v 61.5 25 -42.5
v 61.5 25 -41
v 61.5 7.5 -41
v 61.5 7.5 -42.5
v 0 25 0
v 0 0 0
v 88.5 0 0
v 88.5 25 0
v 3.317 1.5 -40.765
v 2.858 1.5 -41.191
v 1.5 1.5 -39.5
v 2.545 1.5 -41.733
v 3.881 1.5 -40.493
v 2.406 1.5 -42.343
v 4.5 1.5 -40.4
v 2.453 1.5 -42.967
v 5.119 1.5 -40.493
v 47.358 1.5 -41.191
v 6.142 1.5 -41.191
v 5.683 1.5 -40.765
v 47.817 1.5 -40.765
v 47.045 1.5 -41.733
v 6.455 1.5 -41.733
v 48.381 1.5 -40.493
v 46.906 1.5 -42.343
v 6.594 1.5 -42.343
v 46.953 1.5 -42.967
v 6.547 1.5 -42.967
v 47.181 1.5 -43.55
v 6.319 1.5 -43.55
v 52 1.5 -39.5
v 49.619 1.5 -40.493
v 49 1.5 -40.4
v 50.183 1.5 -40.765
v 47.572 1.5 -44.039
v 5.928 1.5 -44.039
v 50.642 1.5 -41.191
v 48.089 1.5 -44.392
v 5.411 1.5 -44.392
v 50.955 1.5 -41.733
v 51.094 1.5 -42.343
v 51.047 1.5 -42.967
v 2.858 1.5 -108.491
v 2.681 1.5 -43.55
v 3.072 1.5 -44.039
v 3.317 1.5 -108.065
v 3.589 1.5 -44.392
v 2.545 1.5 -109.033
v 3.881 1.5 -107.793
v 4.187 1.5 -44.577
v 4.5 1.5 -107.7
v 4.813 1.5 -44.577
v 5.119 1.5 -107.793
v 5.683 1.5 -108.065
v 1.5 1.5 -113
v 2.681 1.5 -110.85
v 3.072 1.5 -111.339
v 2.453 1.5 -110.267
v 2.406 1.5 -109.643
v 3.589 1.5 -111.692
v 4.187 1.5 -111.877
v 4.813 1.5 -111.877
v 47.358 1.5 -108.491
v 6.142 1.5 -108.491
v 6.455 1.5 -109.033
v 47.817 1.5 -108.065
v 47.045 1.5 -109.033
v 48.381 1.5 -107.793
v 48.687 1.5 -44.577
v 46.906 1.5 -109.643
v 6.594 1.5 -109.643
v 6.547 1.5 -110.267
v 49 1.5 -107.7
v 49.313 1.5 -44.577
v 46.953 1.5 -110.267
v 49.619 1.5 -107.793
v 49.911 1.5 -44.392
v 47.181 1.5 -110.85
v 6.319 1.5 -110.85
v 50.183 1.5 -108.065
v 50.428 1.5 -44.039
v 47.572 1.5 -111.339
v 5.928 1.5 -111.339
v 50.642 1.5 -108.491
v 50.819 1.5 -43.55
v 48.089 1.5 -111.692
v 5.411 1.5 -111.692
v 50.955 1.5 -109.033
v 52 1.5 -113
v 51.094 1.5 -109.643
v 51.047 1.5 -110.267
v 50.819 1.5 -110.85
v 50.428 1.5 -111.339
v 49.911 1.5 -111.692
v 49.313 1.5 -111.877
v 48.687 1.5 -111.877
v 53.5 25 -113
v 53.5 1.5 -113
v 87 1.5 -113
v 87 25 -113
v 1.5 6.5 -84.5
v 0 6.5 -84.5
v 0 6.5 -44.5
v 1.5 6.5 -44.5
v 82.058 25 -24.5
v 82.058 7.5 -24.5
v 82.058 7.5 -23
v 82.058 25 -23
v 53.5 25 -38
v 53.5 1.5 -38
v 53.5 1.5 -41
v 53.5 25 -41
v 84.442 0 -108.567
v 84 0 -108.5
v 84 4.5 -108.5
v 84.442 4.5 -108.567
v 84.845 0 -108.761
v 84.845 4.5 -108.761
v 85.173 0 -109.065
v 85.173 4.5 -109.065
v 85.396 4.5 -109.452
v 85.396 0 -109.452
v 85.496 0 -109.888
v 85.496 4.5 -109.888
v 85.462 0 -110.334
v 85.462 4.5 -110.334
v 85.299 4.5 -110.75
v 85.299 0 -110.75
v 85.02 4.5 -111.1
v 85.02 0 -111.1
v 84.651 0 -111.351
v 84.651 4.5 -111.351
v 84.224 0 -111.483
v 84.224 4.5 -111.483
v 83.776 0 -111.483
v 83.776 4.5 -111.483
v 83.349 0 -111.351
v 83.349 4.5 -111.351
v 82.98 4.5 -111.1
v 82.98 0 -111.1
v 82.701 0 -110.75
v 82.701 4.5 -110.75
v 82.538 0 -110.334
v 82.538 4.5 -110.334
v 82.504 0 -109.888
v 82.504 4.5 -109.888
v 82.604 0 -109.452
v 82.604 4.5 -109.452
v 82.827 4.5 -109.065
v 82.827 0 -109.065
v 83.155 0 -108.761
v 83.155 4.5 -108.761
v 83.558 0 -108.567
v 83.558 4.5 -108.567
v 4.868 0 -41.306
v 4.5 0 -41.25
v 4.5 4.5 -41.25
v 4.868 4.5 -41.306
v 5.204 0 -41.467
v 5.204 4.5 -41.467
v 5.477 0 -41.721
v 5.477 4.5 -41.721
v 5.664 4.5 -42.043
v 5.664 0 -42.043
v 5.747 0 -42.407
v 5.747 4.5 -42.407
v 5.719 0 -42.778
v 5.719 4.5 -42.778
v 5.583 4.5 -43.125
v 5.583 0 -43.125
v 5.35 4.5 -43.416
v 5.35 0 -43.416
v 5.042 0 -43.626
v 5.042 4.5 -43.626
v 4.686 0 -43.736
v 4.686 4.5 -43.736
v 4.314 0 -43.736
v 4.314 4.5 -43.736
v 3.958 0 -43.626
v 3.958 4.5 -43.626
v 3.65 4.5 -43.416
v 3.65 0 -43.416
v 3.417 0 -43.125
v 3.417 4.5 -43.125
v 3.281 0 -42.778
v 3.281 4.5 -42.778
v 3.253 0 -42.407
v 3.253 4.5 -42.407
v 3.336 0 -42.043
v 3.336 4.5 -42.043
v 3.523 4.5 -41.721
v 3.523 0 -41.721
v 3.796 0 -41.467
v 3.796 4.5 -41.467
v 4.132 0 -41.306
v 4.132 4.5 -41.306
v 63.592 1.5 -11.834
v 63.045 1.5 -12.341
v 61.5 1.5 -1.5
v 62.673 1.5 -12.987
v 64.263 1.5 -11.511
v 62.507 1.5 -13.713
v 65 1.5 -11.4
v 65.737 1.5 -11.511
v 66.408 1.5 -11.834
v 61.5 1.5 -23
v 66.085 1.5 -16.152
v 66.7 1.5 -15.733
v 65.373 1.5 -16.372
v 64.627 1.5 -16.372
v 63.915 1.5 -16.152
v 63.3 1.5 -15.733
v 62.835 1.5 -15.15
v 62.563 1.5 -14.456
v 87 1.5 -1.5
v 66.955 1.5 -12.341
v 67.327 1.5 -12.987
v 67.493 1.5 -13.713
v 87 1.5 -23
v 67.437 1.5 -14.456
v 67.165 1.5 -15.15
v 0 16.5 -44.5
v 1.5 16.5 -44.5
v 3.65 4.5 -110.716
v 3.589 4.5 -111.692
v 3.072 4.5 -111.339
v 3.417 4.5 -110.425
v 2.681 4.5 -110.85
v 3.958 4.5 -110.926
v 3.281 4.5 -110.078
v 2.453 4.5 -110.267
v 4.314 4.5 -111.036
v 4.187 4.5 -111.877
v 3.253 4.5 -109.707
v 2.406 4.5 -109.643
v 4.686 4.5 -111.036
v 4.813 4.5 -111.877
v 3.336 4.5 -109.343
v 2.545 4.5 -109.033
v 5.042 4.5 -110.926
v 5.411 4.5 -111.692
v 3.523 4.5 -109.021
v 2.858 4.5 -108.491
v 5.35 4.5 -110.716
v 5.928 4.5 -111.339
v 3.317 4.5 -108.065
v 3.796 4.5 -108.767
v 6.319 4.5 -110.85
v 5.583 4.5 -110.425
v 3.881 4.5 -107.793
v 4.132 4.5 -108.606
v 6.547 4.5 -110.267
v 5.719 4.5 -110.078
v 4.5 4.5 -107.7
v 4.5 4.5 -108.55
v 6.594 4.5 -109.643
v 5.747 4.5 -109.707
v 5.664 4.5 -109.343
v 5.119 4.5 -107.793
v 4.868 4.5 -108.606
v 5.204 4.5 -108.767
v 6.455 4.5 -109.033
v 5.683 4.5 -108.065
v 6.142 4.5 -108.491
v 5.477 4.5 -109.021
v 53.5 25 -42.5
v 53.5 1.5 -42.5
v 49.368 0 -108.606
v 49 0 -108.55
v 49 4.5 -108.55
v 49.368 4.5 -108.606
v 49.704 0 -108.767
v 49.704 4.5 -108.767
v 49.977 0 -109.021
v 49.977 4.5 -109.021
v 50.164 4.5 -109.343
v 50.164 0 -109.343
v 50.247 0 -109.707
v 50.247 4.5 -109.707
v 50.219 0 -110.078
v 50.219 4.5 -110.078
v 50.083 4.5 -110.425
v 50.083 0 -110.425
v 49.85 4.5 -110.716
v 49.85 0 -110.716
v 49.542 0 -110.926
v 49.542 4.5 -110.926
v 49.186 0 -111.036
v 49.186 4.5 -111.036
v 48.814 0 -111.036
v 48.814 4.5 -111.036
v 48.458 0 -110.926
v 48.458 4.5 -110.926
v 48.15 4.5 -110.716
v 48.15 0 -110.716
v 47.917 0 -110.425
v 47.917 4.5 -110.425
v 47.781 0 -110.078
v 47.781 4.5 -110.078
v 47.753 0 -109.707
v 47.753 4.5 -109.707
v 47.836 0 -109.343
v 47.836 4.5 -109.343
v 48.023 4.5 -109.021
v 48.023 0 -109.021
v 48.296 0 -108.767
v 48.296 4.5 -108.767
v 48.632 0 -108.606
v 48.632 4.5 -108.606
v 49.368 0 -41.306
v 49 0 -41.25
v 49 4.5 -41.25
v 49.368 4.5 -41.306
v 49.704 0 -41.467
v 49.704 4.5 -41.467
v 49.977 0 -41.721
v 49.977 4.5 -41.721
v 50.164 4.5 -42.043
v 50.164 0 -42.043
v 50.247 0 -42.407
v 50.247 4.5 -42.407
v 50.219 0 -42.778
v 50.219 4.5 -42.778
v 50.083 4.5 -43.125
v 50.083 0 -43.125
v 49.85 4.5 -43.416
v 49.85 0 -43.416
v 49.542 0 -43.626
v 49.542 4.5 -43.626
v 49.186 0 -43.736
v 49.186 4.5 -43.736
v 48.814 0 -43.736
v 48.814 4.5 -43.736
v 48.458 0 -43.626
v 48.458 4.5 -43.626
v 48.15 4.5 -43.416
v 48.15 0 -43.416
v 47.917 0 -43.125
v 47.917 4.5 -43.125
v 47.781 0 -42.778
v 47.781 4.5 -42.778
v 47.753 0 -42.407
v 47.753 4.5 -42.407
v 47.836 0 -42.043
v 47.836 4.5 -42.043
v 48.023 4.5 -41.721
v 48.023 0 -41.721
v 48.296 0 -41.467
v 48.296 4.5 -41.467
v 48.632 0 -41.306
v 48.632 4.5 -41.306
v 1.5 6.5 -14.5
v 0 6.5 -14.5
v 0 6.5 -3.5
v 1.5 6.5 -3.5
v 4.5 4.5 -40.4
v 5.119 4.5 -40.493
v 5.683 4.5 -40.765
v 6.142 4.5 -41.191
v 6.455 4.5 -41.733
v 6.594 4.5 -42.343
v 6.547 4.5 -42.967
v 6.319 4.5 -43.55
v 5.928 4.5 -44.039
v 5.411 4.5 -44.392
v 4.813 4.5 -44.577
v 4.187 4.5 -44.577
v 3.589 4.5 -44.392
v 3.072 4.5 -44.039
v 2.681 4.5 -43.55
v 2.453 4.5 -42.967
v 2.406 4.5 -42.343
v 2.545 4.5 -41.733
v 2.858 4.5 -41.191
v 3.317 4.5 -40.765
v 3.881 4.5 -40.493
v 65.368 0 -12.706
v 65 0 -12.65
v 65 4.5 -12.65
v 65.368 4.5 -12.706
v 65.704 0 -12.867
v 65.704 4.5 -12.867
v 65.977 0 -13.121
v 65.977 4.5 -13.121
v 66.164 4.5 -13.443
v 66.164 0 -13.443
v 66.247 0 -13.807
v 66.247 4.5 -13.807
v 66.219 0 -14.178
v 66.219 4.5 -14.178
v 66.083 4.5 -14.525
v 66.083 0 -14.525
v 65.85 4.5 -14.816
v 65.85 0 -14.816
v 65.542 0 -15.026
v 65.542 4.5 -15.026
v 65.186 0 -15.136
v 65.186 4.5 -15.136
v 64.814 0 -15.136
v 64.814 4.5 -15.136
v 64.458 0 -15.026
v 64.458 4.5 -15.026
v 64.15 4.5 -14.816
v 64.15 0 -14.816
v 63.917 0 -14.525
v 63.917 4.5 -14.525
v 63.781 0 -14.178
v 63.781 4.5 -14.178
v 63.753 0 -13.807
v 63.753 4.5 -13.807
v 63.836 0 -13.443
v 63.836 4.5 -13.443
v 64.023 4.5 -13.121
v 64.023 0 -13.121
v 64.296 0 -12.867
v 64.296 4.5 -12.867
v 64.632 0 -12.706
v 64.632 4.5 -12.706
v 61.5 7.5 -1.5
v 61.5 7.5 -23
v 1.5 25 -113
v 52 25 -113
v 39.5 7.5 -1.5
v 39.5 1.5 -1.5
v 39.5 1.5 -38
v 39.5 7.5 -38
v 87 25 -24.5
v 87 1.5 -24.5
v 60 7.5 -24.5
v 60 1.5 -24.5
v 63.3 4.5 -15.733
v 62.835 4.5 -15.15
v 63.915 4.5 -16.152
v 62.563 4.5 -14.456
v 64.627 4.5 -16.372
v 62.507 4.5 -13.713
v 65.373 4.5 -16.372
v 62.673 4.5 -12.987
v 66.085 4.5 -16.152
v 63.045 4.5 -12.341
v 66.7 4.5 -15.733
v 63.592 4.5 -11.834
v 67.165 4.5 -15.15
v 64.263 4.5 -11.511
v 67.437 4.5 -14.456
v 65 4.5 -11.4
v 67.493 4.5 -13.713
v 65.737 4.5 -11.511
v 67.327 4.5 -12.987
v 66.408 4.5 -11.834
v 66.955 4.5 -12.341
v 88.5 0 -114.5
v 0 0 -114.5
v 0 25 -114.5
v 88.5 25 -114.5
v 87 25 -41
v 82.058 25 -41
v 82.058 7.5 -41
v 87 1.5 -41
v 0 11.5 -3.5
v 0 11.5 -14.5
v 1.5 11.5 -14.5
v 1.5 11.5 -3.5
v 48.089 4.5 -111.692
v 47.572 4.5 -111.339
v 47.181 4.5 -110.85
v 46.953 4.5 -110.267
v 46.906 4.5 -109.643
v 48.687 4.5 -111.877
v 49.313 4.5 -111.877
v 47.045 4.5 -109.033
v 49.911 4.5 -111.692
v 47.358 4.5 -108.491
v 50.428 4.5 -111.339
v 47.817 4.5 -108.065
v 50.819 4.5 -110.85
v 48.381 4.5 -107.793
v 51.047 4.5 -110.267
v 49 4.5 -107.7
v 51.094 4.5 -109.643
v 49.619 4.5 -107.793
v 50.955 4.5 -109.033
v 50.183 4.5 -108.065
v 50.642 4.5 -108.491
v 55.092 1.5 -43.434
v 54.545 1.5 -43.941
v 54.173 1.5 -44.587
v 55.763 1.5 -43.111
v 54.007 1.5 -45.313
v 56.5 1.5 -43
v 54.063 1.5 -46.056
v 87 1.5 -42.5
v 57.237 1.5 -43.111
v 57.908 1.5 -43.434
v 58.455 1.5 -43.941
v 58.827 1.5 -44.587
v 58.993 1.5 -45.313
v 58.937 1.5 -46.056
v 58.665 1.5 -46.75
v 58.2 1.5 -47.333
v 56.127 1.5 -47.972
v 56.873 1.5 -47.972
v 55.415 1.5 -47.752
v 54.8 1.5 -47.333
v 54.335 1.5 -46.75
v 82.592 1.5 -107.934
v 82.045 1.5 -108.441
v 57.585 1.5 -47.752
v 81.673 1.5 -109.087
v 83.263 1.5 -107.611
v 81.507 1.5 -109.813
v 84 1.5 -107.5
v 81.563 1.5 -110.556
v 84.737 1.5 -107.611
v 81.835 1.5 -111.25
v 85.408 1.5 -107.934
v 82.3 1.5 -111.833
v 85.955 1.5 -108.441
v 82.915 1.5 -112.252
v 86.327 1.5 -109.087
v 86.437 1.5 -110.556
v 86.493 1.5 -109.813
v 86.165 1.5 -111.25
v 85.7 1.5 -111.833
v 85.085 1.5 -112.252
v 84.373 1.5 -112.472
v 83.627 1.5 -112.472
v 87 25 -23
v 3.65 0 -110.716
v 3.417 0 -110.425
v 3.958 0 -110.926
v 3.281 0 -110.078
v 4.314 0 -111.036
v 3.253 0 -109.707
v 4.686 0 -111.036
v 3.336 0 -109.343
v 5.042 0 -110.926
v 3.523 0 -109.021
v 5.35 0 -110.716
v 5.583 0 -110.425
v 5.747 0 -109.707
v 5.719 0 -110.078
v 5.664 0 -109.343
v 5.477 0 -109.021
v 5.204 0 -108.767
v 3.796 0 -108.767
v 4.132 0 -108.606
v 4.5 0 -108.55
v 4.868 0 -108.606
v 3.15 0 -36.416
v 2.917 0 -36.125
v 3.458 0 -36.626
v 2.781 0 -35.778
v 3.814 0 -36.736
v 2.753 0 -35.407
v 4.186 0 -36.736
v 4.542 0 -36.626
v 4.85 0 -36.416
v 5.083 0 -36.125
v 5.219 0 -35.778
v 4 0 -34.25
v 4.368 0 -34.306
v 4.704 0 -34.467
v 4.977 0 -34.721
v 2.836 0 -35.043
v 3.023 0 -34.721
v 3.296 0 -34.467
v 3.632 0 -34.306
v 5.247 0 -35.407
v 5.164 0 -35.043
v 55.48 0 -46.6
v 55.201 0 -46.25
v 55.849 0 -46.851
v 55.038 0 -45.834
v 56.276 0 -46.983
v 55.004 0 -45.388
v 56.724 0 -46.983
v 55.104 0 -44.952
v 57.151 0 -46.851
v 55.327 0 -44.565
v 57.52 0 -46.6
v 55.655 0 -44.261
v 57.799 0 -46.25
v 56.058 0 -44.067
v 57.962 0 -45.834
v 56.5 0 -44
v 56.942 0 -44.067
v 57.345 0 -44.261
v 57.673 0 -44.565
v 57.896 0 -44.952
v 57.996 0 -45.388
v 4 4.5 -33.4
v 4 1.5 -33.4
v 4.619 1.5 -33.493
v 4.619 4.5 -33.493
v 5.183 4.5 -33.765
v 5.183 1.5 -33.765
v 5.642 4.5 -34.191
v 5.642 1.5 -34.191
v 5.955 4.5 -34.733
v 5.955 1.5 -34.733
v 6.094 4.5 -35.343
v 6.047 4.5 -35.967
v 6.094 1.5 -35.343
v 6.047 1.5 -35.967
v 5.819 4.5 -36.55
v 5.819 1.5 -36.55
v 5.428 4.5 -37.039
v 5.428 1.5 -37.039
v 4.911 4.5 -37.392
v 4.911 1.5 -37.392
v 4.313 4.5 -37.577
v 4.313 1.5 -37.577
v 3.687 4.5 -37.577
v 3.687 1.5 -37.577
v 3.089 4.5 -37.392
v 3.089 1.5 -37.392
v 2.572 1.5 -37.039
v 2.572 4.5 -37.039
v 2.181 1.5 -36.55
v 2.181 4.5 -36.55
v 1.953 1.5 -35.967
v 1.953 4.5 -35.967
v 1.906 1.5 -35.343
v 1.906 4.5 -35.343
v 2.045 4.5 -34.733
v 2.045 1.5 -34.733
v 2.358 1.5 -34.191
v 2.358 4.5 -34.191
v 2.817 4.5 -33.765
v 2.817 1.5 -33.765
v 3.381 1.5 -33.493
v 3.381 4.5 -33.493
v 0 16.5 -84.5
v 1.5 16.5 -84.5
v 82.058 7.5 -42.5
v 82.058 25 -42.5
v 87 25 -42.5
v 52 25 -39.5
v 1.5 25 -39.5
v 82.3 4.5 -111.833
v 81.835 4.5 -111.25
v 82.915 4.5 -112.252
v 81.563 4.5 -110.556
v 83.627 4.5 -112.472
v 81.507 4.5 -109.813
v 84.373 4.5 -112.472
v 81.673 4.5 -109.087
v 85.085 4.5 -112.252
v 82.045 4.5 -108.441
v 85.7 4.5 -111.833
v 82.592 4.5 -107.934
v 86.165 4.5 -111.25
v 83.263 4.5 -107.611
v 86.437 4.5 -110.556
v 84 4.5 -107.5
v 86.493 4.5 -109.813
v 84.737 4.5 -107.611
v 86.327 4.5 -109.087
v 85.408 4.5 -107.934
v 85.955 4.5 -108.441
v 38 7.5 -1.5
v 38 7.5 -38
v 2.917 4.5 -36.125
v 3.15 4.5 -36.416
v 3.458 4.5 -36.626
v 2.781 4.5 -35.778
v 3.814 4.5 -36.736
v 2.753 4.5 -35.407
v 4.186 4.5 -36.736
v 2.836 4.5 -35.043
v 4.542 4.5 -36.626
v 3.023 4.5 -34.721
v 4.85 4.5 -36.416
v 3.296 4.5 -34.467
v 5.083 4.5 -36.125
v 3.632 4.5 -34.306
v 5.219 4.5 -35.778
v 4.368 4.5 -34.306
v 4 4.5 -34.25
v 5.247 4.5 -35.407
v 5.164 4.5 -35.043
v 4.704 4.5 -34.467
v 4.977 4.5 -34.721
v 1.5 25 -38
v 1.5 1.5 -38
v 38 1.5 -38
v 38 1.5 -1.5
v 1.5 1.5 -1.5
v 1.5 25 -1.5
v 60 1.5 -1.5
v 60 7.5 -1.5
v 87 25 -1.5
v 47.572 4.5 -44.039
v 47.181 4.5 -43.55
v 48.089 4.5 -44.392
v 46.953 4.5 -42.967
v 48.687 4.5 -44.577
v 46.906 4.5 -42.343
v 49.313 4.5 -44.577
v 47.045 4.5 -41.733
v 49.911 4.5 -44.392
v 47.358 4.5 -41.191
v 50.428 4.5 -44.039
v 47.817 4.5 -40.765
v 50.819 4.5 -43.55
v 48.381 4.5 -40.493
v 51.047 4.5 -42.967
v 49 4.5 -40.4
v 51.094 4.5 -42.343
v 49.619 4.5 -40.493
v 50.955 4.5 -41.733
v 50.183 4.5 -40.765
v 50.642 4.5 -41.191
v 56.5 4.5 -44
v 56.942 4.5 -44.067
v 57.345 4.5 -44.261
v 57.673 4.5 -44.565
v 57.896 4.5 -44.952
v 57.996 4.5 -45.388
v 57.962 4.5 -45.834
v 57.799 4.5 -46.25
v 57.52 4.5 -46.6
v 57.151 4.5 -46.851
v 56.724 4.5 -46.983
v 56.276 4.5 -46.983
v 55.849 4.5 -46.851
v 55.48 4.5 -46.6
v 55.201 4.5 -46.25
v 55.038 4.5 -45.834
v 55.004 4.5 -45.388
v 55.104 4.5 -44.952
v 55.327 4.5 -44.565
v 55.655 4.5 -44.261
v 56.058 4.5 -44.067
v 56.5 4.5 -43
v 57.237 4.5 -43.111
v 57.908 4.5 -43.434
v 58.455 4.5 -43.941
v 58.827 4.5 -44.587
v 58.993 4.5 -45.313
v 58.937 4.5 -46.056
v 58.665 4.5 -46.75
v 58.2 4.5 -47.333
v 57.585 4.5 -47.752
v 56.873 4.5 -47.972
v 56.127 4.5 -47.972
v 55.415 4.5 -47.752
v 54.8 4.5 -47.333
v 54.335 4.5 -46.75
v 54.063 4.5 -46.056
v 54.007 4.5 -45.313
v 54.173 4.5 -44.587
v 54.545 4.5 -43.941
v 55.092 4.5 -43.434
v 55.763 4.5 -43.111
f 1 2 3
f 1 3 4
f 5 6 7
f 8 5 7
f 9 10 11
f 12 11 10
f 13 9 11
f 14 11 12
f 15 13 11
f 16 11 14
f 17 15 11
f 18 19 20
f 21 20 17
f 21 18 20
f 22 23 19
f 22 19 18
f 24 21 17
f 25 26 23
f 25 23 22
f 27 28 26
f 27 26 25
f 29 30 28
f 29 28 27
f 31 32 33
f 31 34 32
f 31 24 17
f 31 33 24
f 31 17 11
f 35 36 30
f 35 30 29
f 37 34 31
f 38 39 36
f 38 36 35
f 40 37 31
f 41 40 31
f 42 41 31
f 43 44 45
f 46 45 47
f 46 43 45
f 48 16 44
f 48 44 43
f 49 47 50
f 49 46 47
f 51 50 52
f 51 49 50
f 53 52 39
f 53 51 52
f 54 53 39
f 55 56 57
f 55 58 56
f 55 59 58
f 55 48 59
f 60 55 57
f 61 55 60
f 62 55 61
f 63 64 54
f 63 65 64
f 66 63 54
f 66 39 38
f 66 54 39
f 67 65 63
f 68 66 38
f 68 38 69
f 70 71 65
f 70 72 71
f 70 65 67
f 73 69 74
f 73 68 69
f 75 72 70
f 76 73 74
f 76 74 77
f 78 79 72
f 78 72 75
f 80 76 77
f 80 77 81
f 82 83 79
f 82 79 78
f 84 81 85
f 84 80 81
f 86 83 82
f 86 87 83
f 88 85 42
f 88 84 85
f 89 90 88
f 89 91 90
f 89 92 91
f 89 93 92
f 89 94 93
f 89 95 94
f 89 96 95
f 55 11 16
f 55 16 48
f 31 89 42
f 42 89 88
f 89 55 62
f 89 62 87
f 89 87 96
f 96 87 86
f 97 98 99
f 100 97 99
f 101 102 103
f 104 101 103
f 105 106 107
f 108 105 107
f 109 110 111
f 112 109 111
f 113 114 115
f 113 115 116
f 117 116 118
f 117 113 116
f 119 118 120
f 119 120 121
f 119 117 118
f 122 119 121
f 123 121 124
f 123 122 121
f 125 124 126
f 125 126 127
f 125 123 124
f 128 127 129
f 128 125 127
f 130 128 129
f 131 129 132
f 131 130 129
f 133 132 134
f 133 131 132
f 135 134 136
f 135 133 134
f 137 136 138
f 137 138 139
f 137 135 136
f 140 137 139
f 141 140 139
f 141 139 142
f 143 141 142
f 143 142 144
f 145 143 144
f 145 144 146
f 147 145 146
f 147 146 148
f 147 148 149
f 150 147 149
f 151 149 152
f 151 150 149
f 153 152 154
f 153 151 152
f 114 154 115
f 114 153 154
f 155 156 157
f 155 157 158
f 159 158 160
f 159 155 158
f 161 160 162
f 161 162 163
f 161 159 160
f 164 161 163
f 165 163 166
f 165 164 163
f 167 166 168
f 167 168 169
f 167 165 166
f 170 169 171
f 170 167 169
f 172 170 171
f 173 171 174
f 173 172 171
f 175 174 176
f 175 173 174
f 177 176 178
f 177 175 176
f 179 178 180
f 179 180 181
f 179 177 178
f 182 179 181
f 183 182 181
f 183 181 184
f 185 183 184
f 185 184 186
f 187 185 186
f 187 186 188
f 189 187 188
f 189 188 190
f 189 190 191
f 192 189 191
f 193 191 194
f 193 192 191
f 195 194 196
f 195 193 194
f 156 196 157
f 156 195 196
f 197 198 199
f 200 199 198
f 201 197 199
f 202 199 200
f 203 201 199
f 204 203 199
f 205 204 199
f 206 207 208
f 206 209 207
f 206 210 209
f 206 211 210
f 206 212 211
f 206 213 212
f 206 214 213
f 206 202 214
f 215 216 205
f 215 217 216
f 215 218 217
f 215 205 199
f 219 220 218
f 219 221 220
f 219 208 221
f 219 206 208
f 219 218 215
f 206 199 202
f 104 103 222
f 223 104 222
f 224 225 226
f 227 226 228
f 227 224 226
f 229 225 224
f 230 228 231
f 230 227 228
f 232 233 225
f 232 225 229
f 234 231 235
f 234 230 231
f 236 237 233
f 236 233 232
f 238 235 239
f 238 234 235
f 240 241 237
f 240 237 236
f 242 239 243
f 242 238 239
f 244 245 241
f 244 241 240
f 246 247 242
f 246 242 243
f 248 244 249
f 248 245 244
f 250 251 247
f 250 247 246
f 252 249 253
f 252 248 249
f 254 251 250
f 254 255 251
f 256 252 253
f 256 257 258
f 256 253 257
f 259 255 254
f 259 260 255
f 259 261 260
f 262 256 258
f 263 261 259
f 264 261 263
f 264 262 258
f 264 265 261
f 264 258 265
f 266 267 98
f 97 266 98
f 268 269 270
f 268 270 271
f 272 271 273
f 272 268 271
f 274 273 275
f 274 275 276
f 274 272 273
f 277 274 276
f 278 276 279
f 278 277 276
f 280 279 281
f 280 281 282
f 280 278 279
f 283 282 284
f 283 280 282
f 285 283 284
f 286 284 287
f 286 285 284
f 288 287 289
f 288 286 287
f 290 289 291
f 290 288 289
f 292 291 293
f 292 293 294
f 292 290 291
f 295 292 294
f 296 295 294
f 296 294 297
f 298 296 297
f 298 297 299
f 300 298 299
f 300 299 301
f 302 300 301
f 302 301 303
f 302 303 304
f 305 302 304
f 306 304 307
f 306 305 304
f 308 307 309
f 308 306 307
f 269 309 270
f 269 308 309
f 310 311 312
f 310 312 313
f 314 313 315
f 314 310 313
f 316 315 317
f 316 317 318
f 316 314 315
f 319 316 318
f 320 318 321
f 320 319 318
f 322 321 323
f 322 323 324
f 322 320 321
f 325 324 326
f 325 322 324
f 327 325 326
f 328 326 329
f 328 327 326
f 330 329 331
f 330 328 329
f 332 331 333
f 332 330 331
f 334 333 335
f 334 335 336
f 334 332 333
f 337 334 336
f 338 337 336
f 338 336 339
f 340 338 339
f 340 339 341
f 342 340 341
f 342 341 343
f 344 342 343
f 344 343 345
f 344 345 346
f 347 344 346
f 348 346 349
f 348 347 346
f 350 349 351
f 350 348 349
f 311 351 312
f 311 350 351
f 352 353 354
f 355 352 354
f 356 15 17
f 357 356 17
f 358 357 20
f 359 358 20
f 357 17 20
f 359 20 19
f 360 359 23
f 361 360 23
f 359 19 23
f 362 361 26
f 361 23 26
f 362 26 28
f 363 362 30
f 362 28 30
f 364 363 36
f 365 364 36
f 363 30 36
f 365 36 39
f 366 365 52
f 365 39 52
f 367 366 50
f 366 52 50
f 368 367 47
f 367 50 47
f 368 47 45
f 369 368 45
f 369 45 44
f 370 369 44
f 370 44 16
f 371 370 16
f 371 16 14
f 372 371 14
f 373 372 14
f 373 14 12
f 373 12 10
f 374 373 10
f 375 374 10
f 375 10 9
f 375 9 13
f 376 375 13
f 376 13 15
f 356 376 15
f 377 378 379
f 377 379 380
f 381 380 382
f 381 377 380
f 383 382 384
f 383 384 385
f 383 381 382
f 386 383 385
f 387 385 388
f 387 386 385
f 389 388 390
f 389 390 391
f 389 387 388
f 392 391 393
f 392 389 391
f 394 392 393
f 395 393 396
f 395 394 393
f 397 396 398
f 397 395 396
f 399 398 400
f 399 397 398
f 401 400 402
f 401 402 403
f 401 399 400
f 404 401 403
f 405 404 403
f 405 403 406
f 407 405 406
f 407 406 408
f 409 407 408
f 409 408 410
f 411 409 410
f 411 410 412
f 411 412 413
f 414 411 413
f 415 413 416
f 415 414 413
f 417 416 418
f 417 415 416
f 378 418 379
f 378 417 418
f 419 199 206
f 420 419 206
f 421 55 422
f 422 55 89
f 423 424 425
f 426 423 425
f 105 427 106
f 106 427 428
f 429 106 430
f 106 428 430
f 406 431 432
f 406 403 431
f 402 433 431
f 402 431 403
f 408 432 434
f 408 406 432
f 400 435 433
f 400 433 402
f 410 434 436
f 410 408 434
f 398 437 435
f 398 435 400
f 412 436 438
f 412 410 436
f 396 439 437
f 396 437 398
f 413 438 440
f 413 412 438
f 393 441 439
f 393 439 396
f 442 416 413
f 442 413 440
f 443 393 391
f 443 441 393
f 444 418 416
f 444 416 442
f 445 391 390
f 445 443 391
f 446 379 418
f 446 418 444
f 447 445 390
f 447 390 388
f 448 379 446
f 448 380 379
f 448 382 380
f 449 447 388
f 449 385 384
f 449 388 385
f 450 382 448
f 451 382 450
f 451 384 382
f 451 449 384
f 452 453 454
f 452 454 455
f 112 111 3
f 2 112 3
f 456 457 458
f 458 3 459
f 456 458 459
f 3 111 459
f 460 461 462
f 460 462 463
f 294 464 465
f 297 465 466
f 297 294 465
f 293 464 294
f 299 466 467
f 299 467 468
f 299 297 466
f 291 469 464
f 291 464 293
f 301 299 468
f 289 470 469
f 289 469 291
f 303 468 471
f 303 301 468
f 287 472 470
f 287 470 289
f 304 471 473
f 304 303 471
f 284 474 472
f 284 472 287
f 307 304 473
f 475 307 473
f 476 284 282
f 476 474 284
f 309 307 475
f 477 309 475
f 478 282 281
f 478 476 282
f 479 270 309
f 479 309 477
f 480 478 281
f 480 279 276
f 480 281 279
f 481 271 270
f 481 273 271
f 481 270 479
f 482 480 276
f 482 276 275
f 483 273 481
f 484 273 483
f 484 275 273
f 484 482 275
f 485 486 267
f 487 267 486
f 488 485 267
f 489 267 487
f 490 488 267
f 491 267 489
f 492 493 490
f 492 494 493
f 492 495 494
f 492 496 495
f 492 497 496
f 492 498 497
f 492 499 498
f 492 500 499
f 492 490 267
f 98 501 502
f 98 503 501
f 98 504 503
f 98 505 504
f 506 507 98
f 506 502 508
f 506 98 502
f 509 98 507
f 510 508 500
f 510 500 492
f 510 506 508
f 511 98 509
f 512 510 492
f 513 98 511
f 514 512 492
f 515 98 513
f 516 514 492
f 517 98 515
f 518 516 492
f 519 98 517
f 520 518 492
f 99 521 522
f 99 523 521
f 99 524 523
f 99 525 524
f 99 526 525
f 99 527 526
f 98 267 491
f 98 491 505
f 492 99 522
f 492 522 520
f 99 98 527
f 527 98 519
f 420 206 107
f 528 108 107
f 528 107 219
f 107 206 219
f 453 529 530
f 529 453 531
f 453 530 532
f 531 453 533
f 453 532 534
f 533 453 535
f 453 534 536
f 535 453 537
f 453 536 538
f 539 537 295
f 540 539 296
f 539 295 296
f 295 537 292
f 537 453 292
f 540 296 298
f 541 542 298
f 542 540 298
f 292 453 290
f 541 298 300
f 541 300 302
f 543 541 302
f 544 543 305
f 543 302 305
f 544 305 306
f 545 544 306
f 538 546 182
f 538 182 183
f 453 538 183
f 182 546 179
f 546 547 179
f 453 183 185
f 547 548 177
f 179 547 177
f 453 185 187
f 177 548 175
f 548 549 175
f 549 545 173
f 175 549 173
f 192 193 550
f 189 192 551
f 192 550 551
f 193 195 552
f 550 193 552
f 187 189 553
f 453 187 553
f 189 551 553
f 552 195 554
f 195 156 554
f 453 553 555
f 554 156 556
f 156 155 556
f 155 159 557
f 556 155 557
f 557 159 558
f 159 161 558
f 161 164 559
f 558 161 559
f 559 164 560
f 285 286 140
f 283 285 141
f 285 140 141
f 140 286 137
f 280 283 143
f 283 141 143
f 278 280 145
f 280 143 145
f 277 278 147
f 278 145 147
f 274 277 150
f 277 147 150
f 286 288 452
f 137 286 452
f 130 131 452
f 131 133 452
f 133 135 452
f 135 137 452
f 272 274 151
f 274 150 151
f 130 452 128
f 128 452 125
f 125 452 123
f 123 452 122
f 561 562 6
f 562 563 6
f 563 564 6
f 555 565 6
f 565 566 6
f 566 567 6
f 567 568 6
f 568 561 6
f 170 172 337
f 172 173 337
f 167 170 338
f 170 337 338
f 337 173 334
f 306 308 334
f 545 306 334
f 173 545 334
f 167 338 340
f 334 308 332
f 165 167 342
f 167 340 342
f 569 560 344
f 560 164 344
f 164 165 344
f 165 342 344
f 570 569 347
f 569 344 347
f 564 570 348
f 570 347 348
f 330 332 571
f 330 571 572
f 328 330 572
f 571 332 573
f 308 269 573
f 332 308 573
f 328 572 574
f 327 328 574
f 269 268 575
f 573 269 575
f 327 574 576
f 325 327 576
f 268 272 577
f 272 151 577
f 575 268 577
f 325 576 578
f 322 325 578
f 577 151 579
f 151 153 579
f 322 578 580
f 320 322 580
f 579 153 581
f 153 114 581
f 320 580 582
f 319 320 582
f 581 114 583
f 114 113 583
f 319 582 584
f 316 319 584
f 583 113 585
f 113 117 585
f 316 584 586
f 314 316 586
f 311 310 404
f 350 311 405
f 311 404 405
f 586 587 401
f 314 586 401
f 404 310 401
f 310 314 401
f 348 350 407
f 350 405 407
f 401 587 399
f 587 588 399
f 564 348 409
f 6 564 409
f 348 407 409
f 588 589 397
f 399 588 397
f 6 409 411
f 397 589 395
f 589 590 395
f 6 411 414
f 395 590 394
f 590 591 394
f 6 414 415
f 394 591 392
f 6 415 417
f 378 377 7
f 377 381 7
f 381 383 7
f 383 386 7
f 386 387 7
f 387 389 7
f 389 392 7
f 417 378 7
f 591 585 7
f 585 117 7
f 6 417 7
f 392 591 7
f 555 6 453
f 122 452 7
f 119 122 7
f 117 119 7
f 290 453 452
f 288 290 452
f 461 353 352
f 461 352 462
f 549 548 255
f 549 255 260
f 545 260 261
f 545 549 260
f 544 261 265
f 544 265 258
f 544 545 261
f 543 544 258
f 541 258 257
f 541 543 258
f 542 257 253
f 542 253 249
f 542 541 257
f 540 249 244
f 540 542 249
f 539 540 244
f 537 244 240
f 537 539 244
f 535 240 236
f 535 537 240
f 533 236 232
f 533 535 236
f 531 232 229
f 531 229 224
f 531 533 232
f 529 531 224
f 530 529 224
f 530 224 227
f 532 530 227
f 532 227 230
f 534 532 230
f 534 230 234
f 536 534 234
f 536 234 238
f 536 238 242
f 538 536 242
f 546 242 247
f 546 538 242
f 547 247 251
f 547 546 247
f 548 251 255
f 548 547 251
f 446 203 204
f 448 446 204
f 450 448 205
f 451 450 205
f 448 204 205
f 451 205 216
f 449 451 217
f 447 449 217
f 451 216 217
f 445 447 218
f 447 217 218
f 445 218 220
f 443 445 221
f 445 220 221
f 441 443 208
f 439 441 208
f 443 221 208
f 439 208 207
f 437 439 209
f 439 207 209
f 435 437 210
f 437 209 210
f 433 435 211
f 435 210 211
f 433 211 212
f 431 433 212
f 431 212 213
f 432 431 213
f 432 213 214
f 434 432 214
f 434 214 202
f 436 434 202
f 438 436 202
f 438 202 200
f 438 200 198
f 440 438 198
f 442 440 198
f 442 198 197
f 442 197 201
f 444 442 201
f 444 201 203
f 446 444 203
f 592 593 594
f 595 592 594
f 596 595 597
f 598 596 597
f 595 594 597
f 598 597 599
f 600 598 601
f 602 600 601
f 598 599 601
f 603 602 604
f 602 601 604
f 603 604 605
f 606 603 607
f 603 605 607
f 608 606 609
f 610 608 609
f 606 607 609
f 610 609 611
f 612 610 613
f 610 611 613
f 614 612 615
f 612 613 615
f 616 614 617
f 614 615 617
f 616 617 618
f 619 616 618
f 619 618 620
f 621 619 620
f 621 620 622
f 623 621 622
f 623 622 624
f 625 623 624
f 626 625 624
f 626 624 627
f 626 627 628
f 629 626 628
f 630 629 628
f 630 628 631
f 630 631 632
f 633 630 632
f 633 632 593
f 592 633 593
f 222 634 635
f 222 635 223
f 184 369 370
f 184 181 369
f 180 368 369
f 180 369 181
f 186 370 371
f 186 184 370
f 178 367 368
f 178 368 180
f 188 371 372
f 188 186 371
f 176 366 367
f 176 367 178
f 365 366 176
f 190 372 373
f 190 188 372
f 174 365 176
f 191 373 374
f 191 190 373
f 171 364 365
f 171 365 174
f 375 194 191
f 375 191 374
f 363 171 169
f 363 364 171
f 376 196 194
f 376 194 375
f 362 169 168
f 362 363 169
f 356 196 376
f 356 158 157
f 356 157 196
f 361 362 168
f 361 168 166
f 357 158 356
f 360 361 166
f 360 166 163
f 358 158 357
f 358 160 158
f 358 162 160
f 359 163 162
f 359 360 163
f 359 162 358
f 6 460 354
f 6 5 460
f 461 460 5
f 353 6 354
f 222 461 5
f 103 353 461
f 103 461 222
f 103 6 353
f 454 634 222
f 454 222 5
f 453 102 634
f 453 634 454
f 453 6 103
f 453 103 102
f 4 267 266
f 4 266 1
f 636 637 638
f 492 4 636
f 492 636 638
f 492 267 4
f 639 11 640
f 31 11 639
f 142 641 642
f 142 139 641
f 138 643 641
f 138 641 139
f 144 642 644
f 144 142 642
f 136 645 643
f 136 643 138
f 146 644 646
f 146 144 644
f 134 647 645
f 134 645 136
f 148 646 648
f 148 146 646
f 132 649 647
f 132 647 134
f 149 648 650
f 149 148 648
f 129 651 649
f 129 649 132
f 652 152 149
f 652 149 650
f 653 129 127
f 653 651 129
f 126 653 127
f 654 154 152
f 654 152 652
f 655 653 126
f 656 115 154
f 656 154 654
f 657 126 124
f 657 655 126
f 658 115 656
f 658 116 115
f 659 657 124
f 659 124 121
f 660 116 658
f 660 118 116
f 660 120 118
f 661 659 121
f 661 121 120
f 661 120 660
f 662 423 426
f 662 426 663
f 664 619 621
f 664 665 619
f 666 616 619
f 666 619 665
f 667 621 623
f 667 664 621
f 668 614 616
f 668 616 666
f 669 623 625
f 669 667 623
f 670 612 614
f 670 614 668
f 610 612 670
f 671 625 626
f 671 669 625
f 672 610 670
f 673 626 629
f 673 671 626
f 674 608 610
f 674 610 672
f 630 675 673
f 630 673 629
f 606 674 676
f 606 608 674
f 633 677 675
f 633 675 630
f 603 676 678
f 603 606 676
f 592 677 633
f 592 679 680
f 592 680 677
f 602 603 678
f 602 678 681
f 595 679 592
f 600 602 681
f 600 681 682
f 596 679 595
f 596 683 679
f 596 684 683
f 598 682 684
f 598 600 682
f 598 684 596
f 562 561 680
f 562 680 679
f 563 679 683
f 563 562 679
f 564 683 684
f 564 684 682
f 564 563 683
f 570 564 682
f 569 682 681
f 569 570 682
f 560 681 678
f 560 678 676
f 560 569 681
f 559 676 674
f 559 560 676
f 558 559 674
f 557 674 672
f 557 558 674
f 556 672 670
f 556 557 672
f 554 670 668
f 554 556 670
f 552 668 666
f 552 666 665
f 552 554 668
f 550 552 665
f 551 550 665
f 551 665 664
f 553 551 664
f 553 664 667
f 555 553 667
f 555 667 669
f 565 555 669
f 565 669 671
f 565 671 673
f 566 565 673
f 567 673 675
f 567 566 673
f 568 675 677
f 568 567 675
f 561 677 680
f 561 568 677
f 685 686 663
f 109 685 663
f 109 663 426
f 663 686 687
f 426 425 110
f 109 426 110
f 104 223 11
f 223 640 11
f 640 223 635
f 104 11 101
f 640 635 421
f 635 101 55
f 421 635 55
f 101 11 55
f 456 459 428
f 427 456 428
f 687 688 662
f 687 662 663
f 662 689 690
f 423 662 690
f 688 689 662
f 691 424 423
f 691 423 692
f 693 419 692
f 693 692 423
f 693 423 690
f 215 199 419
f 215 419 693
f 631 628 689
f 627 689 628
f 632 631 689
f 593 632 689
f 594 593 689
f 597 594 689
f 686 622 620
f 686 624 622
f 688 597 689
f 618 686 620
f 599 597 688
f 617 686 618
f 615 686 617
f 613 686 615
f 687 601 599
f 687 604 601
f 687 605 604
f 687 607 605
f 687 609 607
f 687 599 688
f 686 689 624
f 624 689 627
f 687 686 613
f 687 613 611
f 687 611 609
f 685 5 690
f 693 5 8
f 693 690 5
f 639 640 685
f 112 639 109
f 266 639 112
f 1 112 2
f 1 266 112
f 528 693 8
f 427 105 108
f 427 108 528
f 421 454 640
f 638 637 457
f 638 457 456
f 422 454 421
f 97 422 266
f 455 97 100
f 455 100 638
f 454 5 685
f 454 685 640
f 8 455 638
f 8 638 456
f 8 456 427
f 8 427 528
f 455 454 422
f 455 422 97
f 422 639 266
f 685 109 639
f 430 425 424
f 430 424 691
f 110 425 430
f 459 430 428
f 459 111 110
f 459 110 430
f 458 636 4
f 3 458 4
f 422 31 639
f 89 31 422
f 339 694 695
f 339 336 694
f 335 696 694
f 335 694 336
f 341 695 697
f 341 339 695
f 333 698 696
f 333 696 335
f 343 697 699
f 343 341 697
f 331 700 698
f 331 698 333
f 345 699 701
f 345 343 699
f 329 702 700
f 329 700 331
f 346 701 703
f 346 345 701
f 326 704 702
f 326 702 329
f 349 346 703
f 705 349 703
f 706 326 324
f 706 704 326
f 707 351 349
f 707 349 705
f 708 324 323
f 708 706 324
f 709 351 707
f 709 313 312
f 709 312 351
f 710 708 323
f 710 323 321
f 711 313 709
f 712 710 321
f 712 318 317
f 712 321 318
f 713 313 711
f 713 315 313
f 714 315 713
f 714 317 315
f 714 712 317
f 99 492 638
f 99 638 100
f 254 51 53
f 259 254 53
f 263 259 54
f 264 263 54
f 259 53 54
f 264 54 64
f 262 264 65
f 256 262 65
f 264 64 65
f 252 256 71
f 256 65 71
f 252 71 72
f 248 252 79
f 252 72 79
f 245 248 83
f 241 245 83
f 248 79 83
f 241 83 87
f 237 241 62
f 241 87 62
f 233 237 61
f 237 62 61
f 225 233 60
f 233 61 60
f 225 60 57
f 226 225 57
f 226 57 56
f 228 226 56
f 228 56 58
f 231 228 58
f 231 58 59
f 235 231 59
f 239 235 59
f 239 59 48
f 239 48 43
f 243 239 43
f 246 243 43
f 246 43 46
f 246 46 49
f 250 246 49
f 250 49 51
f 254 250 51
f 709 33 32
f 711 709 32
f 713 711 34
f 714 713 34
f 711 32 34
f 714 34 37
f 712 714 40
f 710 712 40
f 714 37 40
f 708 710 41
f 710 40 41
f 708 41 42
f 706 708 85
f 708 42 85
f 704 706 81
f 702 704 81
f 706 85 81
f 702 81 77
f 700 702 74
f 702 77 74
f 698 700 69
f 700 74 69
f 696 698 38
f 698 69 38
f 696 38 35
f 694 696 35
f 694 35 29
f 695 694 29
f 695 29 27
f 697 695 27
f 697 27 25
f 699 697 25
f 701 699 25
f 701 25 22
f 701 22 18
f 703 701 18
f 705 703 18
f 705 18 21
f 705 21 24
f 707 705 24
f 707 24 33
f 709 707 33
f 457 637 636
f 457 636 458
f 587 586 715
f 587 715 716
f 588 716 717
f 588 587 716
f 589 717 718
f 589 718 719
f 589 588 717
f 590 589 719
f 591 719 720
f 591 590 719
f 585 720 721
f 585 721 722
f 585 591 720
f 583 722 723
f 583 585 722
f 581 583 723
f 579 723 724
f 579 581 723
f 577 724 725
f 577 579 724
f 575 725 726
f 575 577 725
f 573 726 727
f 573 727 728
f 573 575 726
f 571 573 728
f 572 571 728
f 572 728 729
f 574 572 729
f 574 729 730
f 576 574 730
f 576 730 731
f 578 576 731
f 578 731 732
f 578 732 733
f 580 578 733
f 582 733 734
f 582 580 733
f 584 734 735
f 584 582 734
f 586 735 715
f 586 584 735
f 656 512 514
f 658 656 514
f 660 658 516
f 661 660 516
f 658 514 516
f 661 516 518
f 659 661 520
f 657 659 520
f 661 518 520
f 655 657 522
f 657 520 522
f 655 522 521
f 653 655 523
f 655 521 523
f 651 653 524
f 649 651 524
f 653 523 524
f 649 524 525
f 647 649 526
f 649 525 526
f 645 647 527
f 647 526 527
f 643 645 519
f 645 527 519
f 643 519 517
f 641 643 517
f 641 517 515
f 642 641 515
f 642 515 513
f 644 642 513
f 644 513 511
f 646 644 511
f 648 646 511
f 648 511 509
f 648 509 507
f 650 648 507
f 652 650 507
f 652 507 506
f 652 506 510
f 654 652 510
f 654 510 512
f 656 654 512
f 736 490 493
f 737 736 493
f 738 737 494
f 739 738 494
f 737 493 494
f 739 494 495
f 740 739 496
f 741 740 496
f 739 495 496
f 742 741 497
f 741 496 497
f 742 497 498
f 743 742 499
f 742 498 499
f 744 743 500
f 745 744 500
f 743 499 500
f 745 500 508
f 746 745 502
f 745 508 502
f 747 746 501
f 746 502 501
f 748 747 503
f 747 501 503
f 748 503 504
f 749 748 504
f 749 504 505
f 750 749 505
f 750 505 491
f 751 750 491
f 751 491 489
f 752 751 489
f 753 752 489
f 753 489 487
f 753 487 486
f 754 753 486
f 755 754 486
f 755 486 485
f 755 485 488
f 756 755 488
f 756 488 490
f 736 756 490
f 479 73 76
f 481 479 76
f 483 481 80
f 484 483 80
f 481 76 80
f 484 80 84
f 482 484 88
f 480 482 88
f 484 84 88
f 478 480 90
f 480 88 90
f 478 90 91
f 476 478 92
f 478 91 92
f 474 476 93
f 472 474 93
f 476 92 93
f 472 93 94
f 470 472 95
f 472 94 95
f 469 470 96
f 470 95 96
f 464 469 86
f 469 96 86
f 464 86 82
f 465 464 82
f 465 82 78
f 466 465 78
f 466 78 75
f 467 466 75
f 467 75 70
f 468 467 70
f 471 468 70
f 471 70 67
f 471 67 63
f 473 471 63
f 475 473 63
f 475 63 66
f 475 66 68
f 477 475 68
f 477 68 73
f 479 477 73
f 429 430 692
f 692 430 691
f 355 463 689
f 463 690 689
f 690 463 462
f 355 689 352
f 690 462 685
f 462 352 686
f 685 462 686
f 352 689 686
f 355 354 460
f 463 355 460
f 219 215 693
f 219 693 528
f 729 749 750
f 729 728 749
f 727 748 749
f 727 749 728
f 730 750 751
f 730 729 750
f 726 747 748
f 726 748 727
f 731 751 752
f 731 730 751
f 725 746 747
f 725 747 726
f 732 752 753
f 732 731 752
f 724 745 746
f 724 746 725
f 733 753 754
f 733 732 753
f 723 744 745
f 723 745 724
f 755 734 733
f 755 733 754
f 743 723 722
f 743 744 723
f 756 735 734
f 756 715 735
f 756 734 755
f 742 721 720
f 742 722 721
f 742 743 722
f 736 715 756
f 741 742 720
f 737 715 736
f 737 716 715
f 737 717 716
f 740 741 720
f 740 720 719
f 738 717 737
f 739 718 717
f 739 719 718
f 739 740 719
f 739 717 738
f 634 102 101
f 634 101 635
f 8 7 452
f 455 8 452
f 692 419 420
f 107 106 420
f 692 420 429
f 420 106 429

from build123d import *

# Parameters (mm, degrees)
SKETCH_3_W          = 88.5
SKETCH_3_H          = 114.5
SKETCH_3_W_2        = 36.5
SKETCH_3_H_2        = 36.5
SKETCH_3_W_3        = 50.5
SKETCH_3_H_3        = 73.5
SKETCH_3_W_4        = 33.5
SKETCH_3_H_4        = 70.5
SKETCH_3_W_5        = 25.5
SKETCH_3_H_5        = 21.5
EXTRUDE_1_DEPTH     = 25
SKETCH_3_3_W        = 36.5
SKETCH_3_3_H        = 36.5
SKETCH_3_3_R        = 2.1
SKETCH_3_3_W_2      = 50.5
SKETCH_3_3_H_2      = 73.5
SKETCH_3_3_W_3      = 33.5
SKETCH_3_3_H_3      = 70.5
SKETCH_3_3_R_2      = 2.5
SKETCH_3_3_W_4      = 25.5
SKETCH_3_3_H_4      = 21.5
EXTRUDE_2_DEPTH     = 1.5
SKETCH_3_5_R        = 2.1
SKETCH_3_5_R_2      = 1.25
SKETCH_3_5_R_3      = 2.5
SKETCH_3_5_R_4      = 1.5
EXTRUDE_4_DEPTH     = 4.5
CUT_EXTRUDE_1_DEPTH = 17.5
CUT_EXTRUDE_2_REACH = 148.859
SKETCH_5_W          = 40
SKETCH_5_H          = 10
SKETCH_5_W_2        = 11
SKETCH_5_H_2        = 5


with BuildPart() as part:
    # 草图3 → 凸台-拉伸1 (new body)
    with BuildSketch(Plane(origin=(0, 0, 0), x_dir=(1, 0, 0), z_dir=(0, 1, 0))):
        with Locations((44.25, 57.25)):
            Rectangle(SKETCH_3_W, SKETCH_3_H)
        Polygon((39.5, 1.5), (39.5, 38), (53.5, 38), (53.5, 41), (87, 41), (87, 24.5), (60, 24.5), (60, 1.5), align=None, mode=Mode.SUBTRACT)
        with Locations((19.75, 19.75)):
            Rectangle(SKETCH_3_W_2, SKETCH_3_H_2, mode=Mode.SUBTRACT)
        with Locations((26.75, 76.25)):
            Rectangle(SKETCH_3_W_3, SKETCH_3_H_3, mode=Mode.SUBTRACT)
        with Locations((70.25, 77.75)):
            Rectangle(SKETCH_3_W_4, SKETCH_3_H_4, mode=Mode.SUBTRACT)
        with Locations((74.25, 12.25)):
            Rectangle(SKETCH_3_W_5, SKETCH_3_H_5, mode=Mode.SUBTRACT)
    extrude(amount=EXTRUDE_1_DEPTH)

    # 草图3<3> → 凸台-拉伸2 (add)
    # profile 1 of 5: a face of its own
    with BuildSketch(Plane(origin=(0, 0, 0), x_dir=(1, 0, 0), z_dir=(0, 1, 0))):
        Polygon((39.5, 38), (39.5, 1.5), (60, 1.5), (60, 24.5), (87, 24.5), (87, 41), (53.5, 41), (53.5, 38), align=None)
    # profile 2 of 5: a face of its own
    with BuildSketch(Plane(origin=(0, 0, 0), x_dir=(1, 0, 0), z_dir=(0, 1, 0))):
        with Locations((19.75, 19.75)):
            Rectangle(SKETCH_3_3_W, SKETCH_3_3_H)
        with Locations(Location((4, 35.5, 0), (0, 0, 270))):
            Circle(SKETCH_3_3_R, mode=Mode.SUBTRACT)
    # profile 3 of 5: a face of its own
    with BuildSketch(Plane(origin=(0, 0, 0), x_dir=(1, 0, 0), z_dir=(0, 1, 0))):
        with Locations((26.75, 76.25)):
            Rectangle(SKETCH_3_3_W_2, SKETCH_3_3_H_2)
        with Locations(Location((4.5, 42.5, 0), (0, 0, 270))):
            Circle(SKETCH_3_3_R, mode=Mode.SUBTRACT)
        with Locations(Location((49, 42.5, 0), (0, 0, 270))):
            Circle(SKETCH_3_3_R, mode=Mode.SUBTRACT)
        with Locations(Location((4.5, 109.8, 0), (0, 0, 270))):
            Circle(SKETCH_3_3_R, mode=Mode.SUBTRACT)
        with Locations(Location((49, 109.8, 0), (0, 0, 270))):
            Circle(SKETCH_3_3_R, mode=Mode.SUBTRACT)
    # profile 4 of 5: a face of its own
    with BuildSketch(Plane(origin=(0, 0, 0), x_dir=(1, 0, 0), z_dir=(0, 1, 0))):
        with Locations((70.25, 77.75)):
            Rectangle(SKETCH_3_3_W_3, SKETCH_3_3_H_3)
        with Locations(Location((56.5, 45.5, 0), (0, 0, 270))):
            Circle(SKETCH_3_3_R_2, mode=Mode.SUBTRACT)
        with Locations(Location((84, 110, 0), (0, 0, 270))):
            Circle(SKETCH_3_3_R_2, mode=Mode.SUBTRACT)
    # profile 5 of 5: a face of its own
    with BuildSketch(Plane(origin=(0, 0, 0), x_dir=(1, 0, 0), z_dir=(0, 1, 0))):
        with Locations((74.25, 12.25)):
            Rectangle(SKETCH_3_3_W_4, SKETCH_3_3_H_4)
        with Locations(Location((65, 13.9, 0), (0, 0, 270))):
            Circle(SKETCH_3_3_R_2, mode=Mode.SUBTRACT)
    extrude(amount=EXTRUDE_2_DEPTH)

    # 草图3<5> → 凸台-拉伸4 (add)
    # profile 1 of 8: a face of its own
    with BuildSketch(Plane(origin=(0, 0, 0), x_dir=(1, 0, 0), z_dir=(0, 1, 0))):
        with Locations(Location((4, 35.5, 0), (0, 0, 270))):
            Circle(SKETCH_3_5_R)
        with Locations(Location((4, 35.5, 0), (0, 0, 270))):
            Circle(SKETCH_3_5_R_2, mode=Mode.SUBTRACT)
    # profile 2 of 8: a face of its own
    with BuildSketch(Plane(origin=(0, 0, 0), x_dir=(1, 0, 0), z_dir=(0, 1, 0))):
        with Locations(Location((4.5, 42.5, 0), (0, 0, 270))):
            Circle(SKETCH_3_5_R)
        with Locations(Location((4.5, 42.5, 0), (0, 0, 270))):
            Circle(SKETCH_3_5_R_2, mode=Mode.SUBTRACT)
    # profile 3 of 8: a face of its own
    with BuildSketch(Plane(origin=(0, 0, 0), x_dir=(1, 0, 0), z_dir=(0, 1, 0))):
        with Locations(Location((49, 42.5, 0), (0, 0, 270))):
            Circle(SKETCH_3_5_R)
        with Locations(Location((49, 42.5, 0), (0, 0, 270))):
            Circle(SKETCH_3_5_R_2, mode=Mode.SUBTRACT)
    # profile 4 of 8: a face of its own
    with BuildSketch(Plane(origin=(0, 0, 0), x_dir=(1, 0, 0), z_dir=(0, 1, 0))):
        with Locations(Location((4.5, 109.8, 0), (0, 0, 270))):
            Circle(SKETCH_3_5_R)
        with Locations(Location((4.5, 109.8, 0), (0, 0, 270))):
            Circle(SKETCH_3_5_R_2, mode=Mode.SUBTRACT)
    # profile 5 of 8: a face of its own
    with BuildSketch(Plane(origin=(0, 0, 0), x_dir=(1, 0, 0), z_dir=(0, 1, 0))):
        with Locations(Location((49, 109.8, 0), (0, 0, 270))):
            Circle(SKETCH_3_5_R)
        with Locations(Location((49, 109.8, 0), (0, 0, 270))):
            Circle(SKETCH_3_5_R_2, mode=Mode.SUBTRACT)
    # profile 6 of 8: a face of its own
    with BuildSketch(Plane(origin=(0, 0, 0), x_dir=(1, 0, 0), z_dir=(0, 1, 0))):
        with Locations(Location((84, 110, 0), (0, 0, 270))):
            Circle(SKETCH_3_5_R_3)
        with Locations(Location((84, 110, 0), (0, 0, 270))):
            Circle(SKETCH_3_5_R_4, mode=Mode.SUBTRACT)
    # profile 7 of 8: a face of its own
    with BuildSketch(Plane(origin=(0, 0, 0), x_dir=(1, 0, 0), z_dir=(0, 1, 0))):
        with Locations(Location((56.5, 45.5, 0), (0, 0, 270))):
            Circle(SKETCH_3_5_R_3)
        with Locations(Location((56.5, 45.5, 0), (0, 0, 270))):
            Circle(SKETCH_3_5_R_4, mode=Mode.SUBTRACT)
    # profile 8 of 8: a face of its own
    with BuildSketch(Plane(origin=(0, 0, 0), x_dir=(1, 0, 0), z_dir=(0, 1, 0))):
        with Locations(Location((65, 13.9, 0), (0, 0, 270))):
            Circle(SKETCH_3_5_R_3)
        with Locations(Location((65, 13.9, 0), (0, 0, 270))):
            Circle(SKETCH_3_5_R_2, mode=Mode.SUBTRACT)
    extrude(amount=EXTRUDE_4_DEPTH)

    # 草图4 → 切除-拉伸1 (cut)
    with BuildSketch(Plane(origin=(0, 25, 0), x_dir=(1, 0, 0), z_dir=(0, 1, 0))):
        Polygon((61.5, 1.5), (38, 1.5), (38, 38), (61.5, 38), (61.5, 44.990704611), (82.058079057, 44.990704611), (82.058079057, 21.502306723), (61.5, 21.502306723), align=None)
    extrude(amount=-CUT_EXTRUDE_1_DEPTH, mode=Mode.SUBTRACT)

    # 草图5 → 切除-拉伸2 (cut, up to next)
    with BuildSketch(Plane.ZY, mode=Mode.PRIVATE) as cut_extrude_2_sk1:
        with Locations((-64.5, 11.5)):
            Rectangle(SKETCH_5_W, SKETCH_5_H)
    cut_extrude_2_tool1 = extrude(cut_extrude_2_sk1.sketch, amount=-CUT_EXTRUDE_2_REACH, mode=Mode.PRIVATE) & part.part
    # 草图5 → 切除-拉伸2 (cut, up to next)
    with BuildSketch(Plane.ZY, mode=Mode.PRIVATE) as cut_extrude_2_sk2:
        with Locations((-9, 9)):
            Rectangle(SKETCH_5_W_2, SKETCH_5_H_2)
    cut_extrude_2_tool2 = extrude(cut_extrude_2_sk2.sketch, amount=-CUT_EXTRUDE_2_REACH, mode=Mode.PRIVATE) & part.part
    add(cut_extrude_2_tool1.solids().sort_by_distance((0, 11.5, -64.5))[0], mode=Mode.SUBTRACT)
    add(cut_extrude_2_tool2.solids().sort_by_distance((0, 9, -9))[0], mode=Mode.SUBTRACT)


solid = part.part
